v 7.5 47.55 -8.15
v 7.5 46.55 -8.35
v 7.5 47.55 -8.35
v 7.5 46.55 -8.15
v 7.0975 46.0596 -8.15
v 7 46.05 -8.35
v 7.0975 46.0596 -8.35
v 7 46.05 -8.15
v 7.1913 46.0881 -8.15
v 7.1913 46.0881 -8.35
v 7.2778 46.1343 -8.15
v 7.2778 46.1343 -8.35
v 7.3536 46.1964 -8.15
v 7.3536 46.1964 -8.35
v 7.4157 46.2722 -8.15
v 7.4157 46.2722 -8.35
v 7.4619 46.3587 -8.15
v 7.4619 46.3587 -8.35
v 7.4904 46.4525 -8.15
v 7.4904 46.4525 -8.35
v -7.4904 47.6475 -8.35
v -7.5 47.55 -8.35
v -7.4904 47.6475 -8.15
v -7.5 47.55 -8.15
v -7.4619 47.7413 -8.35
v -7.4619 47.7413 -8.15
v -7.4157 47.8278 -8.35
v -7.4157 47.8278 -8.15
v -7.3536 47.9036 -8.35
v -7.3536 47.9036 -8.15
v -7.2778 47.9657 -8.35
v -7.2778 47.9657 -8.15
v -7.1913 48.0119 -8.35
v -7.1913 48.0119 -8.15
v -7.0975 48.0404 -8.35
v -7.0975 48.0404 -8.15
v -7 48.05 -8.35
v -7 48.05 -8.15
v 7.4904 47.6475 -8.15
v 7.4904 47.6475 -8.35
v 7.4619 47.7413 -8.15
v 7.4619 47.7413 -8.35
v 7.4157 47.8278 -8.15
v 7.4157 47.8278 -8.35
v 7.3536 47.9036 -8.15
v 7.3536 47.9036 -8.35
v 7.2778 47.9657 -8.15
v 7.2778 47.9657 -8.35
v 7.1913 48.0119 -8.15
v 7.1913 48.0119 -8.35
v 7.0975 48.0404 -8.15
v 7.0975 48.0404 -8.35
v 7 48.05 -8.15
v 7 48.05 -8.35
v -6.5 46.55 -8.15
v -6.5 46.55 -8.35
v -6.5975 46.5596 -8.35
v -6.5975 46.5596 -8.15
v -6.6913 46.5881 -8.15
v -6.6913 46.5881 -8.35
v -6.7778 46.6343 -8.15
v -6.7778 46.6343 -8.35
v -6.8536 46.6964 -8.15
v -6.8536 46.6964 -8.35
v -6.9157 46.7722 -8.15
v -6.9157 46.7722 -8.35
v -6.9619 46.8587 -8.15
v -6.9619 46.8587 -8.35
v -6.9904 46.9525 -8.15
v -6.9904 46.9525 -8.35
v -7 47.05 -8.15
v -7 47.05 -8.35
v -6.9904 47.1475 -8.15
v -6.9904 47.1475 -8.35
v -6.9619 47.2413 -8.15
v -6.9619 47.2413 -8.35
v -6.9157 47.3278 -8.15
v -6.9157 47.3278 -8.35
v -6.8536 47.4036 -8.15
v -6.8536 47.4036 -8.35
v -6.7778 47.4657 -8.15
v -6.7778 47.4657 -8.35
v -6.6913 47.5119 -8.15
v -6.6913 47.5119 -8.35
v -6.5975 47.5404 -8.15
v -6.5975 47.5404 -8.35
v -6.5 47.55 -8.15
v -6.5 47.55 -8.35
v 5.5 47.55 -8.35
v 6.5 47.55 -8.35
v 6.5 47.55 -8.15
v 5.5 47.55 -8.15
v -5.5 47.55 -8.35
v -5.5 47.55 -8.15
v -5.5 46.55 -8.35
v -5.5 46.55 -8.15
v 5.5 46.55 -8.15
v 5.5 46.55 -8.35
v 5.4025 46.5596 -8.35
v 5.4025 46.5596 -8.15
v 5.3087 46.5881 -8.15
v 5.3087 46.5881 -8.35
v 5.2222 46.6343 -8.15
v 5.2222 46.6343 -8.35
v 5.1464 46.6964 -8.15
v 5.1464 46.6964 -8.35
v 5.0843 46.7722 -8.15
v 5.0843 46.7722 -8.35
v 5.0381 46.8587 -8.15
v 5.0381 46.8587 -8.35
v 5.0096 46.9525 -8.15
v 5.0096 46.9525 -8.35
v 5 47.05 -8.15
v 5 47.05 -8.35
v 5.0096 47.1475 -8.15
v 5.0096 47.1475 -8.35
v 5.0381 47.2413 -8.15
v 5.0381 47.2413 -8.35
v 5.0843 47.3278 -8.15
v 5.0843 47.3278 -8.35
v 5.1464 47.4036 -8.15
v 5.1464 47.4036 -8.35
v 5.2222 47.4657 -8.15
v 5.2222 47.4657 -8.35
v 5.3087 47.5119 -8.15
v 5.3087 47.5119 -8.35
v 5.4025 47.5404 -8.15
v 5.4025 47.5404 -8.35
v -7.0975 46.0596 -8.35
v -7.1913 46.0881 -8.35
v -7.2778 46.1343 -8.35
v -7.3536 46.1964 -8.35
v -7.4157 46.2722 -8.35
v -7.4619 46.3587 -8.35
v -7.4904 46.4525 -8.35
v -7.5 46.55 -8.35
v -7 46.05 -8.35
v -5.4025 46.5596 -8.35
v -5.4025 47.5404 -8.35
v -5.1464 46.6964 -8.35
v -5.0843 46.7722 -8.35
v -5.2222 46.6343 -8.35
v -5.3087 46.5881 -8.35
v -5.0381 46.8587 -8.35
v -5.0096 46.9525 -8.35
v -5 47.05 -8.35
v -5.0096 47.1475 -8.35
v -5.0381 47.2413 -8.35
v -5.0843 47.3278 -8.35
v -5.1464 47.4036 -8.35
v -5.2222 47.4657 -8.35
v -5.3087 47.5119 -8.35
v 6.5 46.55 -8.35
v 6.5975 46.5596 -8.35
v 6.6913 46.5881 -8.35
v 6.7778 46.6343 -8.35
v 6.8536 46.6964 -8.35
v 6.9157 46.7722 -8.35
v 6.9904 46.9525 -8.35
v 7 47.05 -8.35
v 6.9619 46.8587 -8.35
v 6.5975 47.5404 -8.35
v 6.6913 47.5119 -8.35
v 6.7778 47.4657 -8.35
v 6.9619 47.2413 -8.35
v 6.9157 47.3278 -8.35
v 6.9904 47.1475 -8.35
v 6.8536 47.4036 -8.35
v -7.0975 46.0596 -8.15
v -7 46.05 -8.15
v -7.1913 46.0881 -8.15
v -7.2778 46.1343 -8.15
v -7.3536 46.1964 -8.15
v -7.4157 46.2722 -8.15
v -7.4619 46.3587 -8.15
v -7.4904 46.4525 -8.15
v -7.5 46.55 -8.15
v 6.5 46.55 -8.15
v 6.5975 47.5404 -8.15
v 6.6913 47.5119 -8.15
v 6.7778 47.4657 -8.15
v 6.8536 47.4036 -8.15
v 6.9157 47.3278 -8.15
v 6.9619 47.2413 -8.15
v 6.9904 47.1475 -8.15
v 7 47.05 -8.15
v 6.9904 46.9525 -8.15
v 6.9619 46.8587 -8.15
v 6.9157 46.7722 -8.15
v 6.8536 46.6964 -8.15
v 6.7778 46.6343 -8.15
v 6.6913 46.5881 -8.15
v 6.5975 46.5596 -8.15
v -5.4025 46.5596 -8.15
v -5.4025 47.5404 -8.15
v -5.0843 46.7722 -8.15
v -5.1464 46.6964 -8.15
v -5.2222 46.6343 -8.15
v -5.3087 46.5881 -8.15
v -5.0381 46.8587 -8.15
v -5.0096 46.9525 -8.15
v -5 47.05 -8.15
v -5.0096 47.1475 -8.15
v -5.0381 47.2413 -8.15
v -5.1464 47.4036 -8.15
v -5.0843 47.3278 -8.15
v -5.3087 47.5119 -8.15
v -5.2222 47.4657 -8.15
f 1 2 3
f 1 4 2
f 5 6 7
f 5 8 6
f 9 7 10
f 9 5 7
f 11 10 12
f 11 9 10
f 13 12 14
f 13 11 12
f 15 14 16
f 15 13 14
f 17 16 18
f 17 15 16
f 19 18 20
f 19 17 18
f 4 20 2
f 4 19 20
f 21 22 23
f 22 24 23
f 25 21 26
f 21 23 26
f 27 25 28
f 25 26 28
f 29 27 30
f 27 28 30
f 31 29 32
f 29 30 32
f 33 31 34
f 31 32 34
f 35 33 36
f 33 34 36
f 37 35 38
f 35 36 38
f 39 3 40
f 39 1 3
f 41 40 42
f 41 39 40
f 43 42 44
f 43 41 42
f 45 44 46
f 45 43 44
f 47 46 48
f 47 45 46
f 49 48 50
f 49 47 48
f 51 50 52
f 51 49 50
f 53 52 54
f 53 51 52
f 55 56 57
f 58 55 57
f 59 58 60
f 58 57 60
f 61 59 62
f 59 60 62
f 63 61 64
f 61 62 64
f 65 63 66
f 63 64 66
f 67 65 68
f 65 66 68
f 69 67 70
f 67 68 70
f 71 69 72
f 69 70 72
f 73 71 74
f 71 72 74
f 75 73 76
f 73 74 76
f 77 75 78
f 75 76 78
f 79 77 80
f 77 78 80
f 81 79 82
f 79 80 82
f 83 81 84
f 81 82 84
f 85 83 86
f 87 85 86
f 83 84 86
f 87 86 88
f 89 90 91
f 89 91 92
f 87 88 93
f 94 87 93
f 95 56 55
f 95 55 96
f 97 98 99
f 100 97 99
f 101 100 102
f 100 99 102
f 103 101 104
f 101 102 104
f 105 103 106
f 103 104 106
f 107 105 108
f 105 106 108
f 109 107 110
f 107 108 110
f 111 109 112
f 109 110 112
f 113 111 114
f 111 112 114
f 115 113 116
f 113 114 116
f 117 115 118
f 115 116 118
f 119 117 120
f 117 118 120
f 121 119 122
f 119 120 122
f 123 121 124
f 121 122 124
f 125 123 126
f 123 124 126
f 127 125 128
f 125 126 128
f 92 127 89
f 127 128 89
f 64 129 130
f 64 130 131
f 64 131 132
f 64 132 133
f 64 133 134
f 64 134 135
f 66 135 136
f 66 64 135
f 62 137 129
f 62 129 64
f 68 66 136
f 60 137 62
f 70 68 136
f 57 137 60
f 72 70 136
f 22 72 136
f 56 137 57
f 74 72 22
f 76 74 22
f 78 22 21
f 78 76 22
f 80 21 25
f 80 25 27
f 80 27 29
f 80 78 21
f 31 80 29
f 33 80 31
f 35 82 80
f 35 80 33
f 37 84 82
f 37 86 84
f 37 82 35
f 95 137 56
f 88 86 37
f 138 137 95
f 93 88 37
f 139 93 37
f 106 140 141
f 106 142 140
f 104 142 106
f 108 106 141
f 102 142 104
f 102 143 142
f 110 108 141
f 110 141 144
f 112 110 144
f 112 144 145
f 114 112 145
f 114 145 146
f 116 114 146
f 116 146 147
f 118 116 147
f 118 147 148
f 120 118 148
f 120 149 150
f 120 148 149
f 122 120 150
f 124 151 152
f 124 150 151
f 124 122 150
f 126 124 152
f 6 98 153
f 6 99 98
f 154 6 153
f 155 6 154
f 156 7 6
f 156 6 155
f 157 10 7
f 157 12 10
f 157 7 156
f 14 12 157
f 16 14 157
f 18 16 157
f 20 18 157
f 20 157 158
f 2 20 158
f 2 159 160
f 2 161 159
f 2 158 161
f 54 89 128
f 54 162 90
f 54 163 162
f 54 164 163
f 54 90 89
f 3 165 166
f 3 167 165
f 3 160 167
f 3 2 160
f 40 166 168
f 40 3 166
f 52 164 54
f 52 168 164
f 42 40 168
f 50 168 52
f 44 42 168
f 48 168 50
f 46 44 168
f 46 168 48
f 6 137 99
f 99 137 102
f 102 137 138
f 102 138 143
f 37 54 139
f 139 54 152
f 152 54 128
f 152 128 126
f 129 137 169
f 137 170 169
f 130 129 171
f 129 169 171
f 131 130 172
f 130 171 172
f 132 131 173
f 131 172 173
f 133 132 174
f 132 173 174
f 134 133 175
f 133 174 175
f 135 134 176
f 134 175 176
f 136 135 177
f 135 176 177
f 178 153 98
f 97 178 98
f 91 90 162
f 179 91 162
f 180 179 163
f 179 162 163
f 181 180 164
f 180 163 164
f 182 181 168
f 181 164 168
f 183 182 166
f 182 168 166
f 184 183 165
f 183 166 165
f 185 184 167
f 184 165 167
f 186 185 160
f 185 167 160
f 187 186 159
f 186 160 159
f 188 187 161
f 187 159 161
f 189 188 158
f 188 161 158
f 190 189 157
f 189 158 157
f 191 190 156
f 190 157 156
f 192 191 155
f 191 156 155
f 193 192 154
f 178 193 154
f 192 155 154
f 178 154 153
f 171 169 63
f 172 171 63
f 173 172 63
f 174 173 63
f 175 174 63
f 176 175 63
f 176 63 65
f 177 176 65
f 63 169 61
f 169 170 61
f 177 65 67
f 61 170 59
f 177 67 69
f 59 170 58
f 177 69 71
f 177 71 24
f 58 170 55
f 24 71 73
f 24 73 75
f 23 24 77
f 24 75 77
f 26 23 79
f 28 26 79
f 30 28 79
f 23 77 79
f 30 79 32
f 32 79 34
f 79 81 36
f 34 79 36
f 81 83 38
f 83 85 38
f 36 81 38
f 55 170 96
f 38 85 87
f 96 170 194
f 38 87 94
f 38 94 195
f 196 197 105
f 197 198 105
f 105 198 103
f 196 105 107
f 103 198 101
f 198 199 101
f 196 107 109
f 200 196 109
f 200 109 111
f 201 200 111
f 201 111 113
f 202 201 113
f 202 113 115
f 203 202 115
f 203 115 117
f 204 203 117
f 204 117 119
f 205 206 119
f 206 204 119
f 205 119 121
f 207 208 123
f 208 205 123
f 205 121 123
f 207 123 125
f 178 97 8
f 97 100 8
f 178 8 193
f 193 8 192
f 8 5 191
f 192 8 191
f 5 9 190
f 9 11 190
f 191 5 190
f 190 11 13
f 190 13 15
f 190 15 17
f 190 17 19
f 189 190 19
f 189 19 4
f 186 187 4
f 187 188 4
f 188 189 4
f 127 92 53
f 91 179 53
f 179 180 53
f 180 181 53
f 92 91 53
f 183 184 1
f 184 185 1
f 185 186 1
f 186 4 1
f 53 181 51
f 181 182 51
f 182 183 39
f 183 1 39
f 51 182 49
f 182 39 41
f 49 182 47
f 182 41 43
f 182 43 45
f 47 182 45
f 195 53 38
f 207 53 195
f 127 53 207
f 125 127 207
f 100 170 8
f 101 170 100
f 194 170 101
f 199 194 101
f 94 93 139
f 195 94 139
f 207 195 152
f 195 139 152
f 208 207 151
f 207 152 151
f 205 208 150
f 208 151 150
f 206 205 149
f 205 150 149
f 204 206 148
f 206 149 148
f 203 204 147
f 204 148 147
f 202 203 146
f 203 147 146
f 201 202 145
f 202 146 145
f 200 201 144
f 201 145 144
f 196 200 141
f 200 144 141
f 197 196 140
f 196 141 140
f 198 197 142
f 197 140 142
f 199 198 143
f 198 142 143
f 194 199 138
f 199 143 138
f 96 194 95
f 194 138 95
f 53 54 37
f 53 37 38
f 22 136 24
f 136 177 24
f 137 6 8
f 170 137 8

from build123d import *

# Parameters (mm, degrees)
SKETCH074_W     = 2
SKETCH074_H     = 0.2
PAD047_DEPTH    = 7.5
POCKET021_DEPTH = 0.2
FILLET019_R     = 0.5


with BuildPart() as part:
    # Sketch074 → Pad047 (new body, symmetric)
    with BuildSketch(Plane.YZ):
        with Locations((21.35, -8.25)):
            Rectangle(SKETCH074_W, SKETCH074_H)
    extrude(amount=PAD047_DEPTH, both=True)

    # Sketch075 (on Face3 of Pad047) → Pocket021 (cut)
    with BuildSketch(Plane.YX.offset(8.35)):
        with BuildLine():
            ThreePointArc((21.85, 6.4999958532), (21.35, 7), (20.85, 6.4999958531))
            Line((20.85, 6.4999958531), (20.85, 5.4999999932))
            ThreePointArc((20.85, 5.4999999932), (21.35, 5), (21.85, 5.4999999932))
            Line((21.85, 6.4999958532), (21.85, 5.4999999932))
        make_face()
        with BuildLine():
            ThreePointArc((20.85, -6.4999958531), (21.35, -7), (21.85, -6.4999958532))
            Line((21.85, -6.4999958532), (21.85, -5.4999999932))
            ThreePointArc((21.85, -5.4999999932), (21.35, -5), (20.85, -5.4999999932))
            Line((20.85, -6.4999958531), (20.85, -5.4999999932))
        make_face()
    extrude(amount=-POCKET021_DEPTH, mode=Mode.SUBTRACT)

    # Fillet019
    fillet019_edges = [part.edges().sort_by_distance(p)[0] for p in [
        (-7.5, 22.35, -8.25),
        (-7.5, 20.35, -8.25),
        (7.5, 20.35, -8.25),
        (7.5, 22.35, -8.25),
    ]]
    fillet(fillet019_edges, radius=FILLET019_R)


with BuildPart() as part_1:
    # Body026 placement: moved
    add(part.part.moved(Location((0, 25.7, 0))))


solid = part_1.part
